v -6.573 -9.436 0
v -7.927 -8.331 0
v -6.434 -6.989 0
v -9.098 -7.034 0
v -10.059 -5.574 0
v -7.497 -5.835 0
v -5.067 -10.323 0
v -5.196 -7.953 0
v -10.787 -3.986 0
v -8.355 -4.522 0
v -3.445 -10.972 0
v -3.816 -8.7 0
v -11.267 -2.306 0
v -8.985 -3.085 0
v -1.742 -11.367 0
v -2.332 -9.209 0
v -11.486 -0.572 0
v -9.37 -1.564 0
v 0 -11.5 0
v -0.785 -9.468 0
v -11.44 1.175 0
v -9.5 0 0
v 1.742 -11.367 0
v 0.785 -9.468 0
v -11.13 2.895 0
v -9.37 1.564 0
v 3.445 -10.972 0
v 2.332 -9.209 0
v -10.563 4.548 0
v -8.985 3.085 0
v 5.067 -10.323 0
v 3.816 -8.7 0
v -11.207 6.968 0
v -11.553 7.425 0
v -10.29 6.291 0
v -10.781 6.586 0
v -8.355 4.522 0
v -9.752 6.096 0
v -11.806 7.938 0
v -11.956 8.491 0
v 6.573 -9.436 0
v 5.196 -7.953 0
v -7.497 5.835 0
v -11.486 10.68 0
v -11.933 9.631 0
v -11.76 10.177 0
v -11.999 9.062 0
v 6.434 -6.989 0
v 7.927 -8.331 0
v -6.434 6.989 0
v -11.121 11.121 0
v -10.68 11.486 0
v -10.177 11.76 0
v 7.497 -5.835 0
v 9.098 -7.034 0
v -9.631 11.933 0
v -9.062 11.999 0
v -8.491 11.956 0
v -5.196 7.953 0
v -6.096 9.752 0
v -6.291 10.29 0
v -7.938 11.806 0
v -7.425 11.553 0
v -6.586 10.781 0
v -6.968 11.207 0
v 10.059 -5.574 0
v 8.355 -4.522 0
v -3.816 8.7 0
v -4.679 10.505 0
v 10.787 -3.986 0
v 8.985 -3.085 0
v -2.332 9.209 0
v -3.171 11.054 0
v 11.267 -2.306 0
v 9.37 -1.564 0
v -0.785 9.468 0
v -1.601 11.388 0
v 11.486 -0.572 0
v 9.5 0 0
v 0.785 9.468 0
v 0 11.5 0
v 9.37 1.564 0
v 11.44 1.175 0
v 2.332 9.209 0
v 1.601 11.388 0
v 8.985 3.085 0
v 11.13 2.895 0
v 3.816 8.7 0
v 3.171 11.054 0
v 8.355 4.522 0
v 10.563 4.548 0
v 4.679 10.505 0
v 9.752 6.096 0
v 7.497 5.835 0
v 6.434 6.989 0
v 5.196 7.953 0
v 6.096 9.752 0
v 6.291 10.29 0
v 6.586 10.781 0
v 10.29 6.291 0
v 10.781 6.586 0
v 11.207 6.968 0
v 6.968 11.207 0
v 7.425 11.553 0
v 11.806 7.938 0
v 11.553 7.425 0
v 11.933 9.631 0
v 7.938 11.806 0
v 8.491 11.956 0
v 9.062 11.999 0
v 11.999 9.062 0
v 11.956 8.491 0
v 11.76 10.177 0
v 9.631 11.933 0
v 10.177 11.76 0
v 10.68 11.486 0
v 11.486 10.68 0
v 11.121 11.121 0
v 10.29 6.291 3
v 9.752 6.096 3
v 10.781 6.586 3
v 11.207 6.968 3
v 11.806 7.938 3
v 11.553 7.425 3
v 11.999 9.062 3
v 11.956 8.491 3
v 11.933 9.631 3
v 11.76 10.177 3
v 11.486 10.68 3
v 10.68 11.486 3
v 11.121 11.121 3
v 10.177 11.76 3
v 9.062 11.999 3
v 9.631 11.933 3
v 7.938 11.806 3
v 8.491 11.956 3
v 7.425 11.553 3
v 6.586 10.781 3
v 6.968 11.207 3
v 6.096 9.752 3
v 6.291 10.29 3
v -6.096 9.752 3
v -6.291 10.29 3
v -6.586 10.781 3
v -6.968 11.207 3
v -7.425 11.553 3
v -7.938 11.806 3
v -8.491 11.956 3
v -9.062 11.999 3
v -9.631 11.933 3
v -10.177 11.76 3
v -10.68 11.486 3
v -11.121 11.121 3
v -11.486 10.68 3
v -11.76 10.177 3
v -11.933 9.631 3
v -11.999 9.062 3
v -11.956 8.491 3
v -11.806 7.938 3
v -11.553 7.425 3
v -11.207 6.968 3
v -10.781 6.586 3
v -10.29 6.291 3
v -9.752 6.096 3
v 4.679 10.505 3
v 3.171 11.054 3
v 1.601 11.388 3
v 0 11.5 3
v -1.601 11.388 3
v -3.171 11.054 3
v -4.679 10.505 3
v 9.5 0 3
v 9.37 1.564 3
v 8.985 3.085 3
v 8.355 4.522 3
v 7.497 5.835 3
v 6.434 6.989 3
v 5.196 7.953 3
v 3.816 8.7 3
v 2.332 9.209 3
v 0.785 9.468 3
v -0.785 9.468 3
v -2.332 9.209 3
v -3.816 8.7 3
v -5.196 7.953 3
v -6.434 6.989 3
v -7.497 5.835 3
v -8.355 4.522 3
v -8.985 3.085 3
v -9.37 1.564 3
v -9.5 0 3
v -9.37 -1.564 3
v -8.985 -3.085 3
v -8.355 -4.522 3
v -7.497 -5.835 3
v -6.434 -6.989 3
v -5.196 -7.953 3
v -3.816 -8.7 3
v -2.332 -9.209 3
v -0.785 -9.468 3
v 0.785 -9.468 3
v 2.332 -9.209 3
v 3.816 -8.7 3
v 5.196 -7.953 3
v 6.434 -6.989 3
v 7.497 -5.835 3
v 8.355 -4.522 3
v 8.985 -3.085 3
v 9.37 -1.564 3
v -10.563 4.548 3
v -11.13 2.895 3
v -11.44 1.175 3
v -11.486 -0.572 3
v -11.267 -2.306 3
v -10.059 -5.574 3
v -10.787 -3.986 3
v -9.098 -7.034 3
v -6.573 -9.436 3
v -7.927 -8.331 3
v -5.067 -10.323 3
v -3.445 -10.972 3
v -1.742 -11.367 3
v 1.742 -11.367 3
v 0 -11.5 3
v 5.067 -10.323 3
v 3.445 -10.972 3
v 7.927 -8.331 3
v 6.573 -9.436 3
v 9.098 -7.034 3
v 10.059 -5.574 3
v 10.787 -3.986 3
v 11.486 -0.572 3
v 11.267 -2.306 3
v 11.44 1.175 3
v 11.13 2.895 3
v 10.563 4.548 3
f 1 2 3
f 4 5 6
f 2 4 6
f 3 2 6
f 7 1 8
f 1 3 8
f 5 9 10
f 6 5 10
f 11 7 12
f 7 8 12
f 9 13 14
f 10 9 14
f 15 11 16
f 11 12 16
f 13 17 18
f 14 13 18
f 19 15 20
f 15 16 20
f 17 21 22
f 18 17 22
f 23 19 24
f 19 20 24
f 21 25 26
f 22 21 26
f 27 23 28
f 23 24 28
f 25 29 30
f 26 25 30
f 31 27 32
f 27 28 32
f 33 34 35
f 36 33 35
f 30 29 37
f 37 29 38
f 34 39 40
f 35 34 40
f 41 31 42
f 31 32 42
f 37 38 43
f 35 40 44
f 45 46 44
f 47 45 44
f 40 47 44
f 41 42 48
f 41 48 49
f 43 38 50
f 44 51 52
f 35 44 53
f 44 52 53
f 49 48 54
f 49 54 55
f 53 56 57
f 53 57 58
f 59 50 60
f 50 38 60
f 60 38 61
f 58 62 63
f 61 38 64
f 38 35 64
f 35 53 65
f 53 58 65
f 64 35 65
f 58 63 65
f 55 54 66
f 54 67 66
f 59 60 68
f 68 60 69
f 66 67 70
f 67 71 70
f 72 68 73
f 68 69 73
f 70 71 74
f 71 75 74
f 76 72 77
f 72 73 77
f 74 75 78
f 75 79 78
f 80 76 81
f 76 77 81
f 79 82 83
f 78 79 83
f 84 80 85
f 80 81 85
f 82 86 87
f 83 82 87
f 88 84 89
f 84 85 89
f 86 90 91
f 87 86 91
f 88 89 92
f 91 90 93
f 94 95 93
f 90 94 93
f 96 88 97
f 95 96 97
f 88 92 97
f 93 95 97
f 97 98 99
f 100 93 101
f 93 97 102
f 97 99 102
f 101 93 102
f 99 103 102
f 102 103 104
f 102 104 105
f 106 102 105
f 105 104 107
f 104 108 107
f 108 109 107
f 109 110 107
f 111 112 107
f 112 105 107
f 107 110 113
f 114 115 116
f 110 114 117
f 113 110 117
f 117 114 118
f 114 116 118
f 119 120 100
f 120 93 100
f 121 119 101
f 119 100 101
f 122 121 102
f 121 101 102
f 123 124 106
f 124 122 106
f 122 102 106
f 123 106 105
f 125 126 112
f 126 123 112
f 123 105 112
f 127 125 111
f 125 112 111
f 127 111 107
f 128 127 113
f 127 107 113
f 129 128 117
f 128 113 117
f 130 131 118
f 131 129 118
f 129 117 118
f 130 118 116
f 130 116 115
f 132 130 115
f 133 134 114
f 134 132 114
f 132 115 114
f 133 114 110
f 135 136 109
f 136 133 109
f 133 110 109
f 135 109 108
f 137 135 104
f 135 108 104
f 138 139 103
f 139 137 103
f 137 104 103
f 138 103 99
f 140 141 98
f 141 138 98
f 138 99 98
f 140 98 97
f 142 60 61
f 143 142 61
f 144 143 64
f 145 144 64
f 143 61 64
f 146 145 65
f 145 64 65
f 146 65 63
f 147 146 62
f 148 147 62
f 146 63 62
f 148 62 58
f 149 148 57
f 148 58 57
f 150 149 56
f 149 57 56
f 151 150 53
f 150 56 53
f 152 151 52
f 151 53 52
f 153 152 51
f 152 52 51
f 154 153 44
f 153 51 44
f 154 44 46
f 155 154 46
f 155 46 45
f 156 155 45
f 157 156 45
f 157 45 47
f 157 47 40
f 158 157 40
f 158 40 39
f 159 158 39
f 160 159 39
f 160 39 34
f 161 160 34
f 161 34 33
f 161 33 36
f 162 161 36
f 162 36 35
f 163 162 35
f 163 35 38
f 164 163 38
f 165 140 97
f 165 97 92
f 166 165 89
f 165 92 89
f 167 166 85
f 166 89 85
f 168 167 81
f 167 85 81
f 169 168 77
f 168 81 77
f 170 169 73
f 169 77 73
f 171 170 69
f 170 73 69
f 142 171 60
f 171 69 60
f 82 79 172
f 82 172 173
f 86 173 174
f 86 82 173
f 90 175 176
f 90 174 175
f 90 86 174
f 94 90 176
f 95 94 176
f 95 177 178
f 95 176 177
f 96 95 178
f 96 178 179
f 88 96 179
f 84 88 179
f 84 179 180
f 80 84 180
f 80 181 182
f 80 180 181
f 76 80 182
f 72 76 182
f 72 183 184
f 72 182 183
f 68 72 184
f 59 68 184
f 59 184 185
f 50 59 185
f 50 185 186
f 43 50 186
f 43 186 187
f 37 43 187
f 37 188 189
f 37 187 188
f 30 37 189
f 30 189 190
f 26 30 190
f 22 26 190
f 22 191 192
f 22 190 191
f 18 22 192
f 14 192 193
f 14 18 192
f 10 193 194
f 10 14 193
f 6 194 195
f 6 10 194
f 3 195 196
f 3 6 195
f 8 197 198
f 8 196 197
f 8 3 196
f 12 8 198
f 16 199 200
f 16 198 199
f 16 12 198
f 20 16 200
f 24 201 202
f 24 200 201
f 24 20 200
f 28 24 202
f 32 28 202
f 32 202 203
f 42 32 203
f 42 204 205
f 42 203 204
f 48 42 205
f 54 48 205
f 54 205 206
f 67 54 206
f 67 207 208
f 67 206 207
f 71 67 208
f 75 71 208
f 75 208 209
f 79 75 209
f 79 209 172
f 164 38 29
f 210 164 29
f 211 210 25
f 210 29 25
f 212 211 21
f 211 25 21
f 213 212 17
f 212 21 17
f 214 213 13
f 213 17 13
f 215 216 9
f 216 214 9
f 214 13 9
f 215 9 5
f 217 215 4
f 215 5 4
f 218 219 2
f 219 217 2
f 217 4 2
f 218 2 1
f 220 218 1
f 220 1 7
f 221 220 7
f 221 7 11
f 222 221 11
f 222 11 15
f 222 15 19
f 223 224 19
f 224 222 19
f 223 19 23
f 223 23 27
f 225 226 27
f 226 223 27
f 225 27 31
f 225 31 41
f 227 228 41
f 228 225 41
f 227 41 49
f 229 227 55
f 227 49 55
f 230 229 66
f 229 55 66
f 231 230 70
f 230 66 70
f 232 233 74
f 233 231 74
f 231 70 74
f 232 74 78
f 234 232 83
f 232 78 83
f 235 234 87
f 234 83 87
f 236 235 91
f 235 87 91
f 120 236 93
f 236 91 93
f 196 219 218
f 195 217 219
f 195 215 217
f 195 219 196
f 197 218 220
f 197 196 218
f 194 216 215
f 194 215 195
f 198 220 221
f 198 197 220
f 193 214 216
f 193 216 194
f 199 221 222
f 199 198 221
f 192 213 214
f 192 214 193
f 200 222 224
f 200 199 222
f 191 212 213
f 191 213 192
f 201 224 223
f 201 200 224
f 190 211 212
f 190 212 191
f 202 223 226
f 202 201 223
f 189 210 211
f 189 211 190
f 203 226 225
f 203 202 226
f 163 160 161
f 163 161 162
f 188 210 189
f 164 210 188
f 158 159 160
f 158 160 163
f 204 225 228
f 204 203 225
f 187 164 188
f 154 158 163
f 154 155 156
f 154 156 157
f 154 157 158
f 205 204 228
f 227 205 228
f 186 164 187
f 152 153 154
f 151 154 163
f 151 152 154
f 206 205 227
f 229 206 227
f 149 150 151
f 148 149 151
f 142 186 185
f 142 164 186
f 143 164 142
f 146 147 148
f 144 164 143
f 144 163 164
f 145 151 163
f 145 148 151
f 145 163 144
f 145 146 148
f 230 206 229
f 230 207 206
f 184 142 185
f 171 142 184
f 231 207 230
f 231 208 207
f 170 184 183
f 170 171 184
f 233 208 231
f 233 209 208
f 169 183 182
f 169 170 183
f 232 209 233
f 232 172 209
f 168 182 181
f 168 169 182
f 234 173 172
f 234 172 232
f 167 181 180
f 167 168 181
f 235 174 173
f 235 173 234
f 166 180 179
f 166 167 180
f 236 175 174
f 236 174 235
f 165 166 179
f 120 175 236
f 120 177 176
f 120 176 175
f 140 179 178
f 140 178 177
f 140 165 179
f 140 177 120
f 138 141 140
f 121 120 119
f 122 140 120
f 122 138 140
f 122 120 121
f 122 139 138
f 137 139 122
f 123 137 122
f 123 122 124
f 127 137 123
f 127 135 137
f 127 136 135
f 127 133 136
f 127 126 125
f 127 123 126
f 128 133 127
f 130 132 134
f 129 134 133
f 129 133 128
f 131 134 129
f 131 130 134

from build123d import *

# Parameters (mm, degrees)
CYLINDER003_R     = 3
CYLINDER003_DEPTH = 3
CYLINDER001_R     = 9.5
CYLINDER001_DEPTH = 10
CYLINDER_R        = 11.5
CYLINDER_DEPTH    = 3
CYLINDER002_R     = 3
CYLINDER002_DEPTH = 3


with BuildPart() as oreja_decha:
    # Cylinder003 → Cylinder003 (new body)
    with BuildSketch(Plane(origin=(9, 9, 0), x_dir=(1, 0, 0), z_dir=(0, 0, 1))):
        Circle(CYLINDER003_R)
    extrude(amount=CYLINDER003_DEPTH)


with BuildPart() as cilindro_interior:
    # Cylinder001 → Cylinder001 (new body)
    with BuildSketch(Plane.XY.offset(-4)):
        Circle(CYLINDER001_R)
    extrude(amount=CYLINDER001_DEPTH)


with BuildPart() as cuerpo_anillo:
    # Cylinder → Cylinder (new body)
    with BuildSketch(Plane.XY):
        Circle(CYLINDER_R)
    extrude(amount=CYLINDER_DEPTH)

    # Cut: cut Cilindro-interior
    add(cilindro_interior.part, mode=Mode.SUBTRACT)


with BuildPart() as anillo_final:
    # Cylinder002 → Cylinder002 (new body)
    with BuildSketch(Plane(origin=(-9, 9, 0), x_dir=(1, 0, 0), z_dir=(0, 0, 1))):
        Circle(CYLINDER002_R)
    extrude(amount=CYLINDER002_DEPTH)

    # Fusion: union Oreja-decha, cuerpo-anillo
    add(oreja_decha.part)
    add(cuerpo_anillo.part)


solid = anillo_final.part
